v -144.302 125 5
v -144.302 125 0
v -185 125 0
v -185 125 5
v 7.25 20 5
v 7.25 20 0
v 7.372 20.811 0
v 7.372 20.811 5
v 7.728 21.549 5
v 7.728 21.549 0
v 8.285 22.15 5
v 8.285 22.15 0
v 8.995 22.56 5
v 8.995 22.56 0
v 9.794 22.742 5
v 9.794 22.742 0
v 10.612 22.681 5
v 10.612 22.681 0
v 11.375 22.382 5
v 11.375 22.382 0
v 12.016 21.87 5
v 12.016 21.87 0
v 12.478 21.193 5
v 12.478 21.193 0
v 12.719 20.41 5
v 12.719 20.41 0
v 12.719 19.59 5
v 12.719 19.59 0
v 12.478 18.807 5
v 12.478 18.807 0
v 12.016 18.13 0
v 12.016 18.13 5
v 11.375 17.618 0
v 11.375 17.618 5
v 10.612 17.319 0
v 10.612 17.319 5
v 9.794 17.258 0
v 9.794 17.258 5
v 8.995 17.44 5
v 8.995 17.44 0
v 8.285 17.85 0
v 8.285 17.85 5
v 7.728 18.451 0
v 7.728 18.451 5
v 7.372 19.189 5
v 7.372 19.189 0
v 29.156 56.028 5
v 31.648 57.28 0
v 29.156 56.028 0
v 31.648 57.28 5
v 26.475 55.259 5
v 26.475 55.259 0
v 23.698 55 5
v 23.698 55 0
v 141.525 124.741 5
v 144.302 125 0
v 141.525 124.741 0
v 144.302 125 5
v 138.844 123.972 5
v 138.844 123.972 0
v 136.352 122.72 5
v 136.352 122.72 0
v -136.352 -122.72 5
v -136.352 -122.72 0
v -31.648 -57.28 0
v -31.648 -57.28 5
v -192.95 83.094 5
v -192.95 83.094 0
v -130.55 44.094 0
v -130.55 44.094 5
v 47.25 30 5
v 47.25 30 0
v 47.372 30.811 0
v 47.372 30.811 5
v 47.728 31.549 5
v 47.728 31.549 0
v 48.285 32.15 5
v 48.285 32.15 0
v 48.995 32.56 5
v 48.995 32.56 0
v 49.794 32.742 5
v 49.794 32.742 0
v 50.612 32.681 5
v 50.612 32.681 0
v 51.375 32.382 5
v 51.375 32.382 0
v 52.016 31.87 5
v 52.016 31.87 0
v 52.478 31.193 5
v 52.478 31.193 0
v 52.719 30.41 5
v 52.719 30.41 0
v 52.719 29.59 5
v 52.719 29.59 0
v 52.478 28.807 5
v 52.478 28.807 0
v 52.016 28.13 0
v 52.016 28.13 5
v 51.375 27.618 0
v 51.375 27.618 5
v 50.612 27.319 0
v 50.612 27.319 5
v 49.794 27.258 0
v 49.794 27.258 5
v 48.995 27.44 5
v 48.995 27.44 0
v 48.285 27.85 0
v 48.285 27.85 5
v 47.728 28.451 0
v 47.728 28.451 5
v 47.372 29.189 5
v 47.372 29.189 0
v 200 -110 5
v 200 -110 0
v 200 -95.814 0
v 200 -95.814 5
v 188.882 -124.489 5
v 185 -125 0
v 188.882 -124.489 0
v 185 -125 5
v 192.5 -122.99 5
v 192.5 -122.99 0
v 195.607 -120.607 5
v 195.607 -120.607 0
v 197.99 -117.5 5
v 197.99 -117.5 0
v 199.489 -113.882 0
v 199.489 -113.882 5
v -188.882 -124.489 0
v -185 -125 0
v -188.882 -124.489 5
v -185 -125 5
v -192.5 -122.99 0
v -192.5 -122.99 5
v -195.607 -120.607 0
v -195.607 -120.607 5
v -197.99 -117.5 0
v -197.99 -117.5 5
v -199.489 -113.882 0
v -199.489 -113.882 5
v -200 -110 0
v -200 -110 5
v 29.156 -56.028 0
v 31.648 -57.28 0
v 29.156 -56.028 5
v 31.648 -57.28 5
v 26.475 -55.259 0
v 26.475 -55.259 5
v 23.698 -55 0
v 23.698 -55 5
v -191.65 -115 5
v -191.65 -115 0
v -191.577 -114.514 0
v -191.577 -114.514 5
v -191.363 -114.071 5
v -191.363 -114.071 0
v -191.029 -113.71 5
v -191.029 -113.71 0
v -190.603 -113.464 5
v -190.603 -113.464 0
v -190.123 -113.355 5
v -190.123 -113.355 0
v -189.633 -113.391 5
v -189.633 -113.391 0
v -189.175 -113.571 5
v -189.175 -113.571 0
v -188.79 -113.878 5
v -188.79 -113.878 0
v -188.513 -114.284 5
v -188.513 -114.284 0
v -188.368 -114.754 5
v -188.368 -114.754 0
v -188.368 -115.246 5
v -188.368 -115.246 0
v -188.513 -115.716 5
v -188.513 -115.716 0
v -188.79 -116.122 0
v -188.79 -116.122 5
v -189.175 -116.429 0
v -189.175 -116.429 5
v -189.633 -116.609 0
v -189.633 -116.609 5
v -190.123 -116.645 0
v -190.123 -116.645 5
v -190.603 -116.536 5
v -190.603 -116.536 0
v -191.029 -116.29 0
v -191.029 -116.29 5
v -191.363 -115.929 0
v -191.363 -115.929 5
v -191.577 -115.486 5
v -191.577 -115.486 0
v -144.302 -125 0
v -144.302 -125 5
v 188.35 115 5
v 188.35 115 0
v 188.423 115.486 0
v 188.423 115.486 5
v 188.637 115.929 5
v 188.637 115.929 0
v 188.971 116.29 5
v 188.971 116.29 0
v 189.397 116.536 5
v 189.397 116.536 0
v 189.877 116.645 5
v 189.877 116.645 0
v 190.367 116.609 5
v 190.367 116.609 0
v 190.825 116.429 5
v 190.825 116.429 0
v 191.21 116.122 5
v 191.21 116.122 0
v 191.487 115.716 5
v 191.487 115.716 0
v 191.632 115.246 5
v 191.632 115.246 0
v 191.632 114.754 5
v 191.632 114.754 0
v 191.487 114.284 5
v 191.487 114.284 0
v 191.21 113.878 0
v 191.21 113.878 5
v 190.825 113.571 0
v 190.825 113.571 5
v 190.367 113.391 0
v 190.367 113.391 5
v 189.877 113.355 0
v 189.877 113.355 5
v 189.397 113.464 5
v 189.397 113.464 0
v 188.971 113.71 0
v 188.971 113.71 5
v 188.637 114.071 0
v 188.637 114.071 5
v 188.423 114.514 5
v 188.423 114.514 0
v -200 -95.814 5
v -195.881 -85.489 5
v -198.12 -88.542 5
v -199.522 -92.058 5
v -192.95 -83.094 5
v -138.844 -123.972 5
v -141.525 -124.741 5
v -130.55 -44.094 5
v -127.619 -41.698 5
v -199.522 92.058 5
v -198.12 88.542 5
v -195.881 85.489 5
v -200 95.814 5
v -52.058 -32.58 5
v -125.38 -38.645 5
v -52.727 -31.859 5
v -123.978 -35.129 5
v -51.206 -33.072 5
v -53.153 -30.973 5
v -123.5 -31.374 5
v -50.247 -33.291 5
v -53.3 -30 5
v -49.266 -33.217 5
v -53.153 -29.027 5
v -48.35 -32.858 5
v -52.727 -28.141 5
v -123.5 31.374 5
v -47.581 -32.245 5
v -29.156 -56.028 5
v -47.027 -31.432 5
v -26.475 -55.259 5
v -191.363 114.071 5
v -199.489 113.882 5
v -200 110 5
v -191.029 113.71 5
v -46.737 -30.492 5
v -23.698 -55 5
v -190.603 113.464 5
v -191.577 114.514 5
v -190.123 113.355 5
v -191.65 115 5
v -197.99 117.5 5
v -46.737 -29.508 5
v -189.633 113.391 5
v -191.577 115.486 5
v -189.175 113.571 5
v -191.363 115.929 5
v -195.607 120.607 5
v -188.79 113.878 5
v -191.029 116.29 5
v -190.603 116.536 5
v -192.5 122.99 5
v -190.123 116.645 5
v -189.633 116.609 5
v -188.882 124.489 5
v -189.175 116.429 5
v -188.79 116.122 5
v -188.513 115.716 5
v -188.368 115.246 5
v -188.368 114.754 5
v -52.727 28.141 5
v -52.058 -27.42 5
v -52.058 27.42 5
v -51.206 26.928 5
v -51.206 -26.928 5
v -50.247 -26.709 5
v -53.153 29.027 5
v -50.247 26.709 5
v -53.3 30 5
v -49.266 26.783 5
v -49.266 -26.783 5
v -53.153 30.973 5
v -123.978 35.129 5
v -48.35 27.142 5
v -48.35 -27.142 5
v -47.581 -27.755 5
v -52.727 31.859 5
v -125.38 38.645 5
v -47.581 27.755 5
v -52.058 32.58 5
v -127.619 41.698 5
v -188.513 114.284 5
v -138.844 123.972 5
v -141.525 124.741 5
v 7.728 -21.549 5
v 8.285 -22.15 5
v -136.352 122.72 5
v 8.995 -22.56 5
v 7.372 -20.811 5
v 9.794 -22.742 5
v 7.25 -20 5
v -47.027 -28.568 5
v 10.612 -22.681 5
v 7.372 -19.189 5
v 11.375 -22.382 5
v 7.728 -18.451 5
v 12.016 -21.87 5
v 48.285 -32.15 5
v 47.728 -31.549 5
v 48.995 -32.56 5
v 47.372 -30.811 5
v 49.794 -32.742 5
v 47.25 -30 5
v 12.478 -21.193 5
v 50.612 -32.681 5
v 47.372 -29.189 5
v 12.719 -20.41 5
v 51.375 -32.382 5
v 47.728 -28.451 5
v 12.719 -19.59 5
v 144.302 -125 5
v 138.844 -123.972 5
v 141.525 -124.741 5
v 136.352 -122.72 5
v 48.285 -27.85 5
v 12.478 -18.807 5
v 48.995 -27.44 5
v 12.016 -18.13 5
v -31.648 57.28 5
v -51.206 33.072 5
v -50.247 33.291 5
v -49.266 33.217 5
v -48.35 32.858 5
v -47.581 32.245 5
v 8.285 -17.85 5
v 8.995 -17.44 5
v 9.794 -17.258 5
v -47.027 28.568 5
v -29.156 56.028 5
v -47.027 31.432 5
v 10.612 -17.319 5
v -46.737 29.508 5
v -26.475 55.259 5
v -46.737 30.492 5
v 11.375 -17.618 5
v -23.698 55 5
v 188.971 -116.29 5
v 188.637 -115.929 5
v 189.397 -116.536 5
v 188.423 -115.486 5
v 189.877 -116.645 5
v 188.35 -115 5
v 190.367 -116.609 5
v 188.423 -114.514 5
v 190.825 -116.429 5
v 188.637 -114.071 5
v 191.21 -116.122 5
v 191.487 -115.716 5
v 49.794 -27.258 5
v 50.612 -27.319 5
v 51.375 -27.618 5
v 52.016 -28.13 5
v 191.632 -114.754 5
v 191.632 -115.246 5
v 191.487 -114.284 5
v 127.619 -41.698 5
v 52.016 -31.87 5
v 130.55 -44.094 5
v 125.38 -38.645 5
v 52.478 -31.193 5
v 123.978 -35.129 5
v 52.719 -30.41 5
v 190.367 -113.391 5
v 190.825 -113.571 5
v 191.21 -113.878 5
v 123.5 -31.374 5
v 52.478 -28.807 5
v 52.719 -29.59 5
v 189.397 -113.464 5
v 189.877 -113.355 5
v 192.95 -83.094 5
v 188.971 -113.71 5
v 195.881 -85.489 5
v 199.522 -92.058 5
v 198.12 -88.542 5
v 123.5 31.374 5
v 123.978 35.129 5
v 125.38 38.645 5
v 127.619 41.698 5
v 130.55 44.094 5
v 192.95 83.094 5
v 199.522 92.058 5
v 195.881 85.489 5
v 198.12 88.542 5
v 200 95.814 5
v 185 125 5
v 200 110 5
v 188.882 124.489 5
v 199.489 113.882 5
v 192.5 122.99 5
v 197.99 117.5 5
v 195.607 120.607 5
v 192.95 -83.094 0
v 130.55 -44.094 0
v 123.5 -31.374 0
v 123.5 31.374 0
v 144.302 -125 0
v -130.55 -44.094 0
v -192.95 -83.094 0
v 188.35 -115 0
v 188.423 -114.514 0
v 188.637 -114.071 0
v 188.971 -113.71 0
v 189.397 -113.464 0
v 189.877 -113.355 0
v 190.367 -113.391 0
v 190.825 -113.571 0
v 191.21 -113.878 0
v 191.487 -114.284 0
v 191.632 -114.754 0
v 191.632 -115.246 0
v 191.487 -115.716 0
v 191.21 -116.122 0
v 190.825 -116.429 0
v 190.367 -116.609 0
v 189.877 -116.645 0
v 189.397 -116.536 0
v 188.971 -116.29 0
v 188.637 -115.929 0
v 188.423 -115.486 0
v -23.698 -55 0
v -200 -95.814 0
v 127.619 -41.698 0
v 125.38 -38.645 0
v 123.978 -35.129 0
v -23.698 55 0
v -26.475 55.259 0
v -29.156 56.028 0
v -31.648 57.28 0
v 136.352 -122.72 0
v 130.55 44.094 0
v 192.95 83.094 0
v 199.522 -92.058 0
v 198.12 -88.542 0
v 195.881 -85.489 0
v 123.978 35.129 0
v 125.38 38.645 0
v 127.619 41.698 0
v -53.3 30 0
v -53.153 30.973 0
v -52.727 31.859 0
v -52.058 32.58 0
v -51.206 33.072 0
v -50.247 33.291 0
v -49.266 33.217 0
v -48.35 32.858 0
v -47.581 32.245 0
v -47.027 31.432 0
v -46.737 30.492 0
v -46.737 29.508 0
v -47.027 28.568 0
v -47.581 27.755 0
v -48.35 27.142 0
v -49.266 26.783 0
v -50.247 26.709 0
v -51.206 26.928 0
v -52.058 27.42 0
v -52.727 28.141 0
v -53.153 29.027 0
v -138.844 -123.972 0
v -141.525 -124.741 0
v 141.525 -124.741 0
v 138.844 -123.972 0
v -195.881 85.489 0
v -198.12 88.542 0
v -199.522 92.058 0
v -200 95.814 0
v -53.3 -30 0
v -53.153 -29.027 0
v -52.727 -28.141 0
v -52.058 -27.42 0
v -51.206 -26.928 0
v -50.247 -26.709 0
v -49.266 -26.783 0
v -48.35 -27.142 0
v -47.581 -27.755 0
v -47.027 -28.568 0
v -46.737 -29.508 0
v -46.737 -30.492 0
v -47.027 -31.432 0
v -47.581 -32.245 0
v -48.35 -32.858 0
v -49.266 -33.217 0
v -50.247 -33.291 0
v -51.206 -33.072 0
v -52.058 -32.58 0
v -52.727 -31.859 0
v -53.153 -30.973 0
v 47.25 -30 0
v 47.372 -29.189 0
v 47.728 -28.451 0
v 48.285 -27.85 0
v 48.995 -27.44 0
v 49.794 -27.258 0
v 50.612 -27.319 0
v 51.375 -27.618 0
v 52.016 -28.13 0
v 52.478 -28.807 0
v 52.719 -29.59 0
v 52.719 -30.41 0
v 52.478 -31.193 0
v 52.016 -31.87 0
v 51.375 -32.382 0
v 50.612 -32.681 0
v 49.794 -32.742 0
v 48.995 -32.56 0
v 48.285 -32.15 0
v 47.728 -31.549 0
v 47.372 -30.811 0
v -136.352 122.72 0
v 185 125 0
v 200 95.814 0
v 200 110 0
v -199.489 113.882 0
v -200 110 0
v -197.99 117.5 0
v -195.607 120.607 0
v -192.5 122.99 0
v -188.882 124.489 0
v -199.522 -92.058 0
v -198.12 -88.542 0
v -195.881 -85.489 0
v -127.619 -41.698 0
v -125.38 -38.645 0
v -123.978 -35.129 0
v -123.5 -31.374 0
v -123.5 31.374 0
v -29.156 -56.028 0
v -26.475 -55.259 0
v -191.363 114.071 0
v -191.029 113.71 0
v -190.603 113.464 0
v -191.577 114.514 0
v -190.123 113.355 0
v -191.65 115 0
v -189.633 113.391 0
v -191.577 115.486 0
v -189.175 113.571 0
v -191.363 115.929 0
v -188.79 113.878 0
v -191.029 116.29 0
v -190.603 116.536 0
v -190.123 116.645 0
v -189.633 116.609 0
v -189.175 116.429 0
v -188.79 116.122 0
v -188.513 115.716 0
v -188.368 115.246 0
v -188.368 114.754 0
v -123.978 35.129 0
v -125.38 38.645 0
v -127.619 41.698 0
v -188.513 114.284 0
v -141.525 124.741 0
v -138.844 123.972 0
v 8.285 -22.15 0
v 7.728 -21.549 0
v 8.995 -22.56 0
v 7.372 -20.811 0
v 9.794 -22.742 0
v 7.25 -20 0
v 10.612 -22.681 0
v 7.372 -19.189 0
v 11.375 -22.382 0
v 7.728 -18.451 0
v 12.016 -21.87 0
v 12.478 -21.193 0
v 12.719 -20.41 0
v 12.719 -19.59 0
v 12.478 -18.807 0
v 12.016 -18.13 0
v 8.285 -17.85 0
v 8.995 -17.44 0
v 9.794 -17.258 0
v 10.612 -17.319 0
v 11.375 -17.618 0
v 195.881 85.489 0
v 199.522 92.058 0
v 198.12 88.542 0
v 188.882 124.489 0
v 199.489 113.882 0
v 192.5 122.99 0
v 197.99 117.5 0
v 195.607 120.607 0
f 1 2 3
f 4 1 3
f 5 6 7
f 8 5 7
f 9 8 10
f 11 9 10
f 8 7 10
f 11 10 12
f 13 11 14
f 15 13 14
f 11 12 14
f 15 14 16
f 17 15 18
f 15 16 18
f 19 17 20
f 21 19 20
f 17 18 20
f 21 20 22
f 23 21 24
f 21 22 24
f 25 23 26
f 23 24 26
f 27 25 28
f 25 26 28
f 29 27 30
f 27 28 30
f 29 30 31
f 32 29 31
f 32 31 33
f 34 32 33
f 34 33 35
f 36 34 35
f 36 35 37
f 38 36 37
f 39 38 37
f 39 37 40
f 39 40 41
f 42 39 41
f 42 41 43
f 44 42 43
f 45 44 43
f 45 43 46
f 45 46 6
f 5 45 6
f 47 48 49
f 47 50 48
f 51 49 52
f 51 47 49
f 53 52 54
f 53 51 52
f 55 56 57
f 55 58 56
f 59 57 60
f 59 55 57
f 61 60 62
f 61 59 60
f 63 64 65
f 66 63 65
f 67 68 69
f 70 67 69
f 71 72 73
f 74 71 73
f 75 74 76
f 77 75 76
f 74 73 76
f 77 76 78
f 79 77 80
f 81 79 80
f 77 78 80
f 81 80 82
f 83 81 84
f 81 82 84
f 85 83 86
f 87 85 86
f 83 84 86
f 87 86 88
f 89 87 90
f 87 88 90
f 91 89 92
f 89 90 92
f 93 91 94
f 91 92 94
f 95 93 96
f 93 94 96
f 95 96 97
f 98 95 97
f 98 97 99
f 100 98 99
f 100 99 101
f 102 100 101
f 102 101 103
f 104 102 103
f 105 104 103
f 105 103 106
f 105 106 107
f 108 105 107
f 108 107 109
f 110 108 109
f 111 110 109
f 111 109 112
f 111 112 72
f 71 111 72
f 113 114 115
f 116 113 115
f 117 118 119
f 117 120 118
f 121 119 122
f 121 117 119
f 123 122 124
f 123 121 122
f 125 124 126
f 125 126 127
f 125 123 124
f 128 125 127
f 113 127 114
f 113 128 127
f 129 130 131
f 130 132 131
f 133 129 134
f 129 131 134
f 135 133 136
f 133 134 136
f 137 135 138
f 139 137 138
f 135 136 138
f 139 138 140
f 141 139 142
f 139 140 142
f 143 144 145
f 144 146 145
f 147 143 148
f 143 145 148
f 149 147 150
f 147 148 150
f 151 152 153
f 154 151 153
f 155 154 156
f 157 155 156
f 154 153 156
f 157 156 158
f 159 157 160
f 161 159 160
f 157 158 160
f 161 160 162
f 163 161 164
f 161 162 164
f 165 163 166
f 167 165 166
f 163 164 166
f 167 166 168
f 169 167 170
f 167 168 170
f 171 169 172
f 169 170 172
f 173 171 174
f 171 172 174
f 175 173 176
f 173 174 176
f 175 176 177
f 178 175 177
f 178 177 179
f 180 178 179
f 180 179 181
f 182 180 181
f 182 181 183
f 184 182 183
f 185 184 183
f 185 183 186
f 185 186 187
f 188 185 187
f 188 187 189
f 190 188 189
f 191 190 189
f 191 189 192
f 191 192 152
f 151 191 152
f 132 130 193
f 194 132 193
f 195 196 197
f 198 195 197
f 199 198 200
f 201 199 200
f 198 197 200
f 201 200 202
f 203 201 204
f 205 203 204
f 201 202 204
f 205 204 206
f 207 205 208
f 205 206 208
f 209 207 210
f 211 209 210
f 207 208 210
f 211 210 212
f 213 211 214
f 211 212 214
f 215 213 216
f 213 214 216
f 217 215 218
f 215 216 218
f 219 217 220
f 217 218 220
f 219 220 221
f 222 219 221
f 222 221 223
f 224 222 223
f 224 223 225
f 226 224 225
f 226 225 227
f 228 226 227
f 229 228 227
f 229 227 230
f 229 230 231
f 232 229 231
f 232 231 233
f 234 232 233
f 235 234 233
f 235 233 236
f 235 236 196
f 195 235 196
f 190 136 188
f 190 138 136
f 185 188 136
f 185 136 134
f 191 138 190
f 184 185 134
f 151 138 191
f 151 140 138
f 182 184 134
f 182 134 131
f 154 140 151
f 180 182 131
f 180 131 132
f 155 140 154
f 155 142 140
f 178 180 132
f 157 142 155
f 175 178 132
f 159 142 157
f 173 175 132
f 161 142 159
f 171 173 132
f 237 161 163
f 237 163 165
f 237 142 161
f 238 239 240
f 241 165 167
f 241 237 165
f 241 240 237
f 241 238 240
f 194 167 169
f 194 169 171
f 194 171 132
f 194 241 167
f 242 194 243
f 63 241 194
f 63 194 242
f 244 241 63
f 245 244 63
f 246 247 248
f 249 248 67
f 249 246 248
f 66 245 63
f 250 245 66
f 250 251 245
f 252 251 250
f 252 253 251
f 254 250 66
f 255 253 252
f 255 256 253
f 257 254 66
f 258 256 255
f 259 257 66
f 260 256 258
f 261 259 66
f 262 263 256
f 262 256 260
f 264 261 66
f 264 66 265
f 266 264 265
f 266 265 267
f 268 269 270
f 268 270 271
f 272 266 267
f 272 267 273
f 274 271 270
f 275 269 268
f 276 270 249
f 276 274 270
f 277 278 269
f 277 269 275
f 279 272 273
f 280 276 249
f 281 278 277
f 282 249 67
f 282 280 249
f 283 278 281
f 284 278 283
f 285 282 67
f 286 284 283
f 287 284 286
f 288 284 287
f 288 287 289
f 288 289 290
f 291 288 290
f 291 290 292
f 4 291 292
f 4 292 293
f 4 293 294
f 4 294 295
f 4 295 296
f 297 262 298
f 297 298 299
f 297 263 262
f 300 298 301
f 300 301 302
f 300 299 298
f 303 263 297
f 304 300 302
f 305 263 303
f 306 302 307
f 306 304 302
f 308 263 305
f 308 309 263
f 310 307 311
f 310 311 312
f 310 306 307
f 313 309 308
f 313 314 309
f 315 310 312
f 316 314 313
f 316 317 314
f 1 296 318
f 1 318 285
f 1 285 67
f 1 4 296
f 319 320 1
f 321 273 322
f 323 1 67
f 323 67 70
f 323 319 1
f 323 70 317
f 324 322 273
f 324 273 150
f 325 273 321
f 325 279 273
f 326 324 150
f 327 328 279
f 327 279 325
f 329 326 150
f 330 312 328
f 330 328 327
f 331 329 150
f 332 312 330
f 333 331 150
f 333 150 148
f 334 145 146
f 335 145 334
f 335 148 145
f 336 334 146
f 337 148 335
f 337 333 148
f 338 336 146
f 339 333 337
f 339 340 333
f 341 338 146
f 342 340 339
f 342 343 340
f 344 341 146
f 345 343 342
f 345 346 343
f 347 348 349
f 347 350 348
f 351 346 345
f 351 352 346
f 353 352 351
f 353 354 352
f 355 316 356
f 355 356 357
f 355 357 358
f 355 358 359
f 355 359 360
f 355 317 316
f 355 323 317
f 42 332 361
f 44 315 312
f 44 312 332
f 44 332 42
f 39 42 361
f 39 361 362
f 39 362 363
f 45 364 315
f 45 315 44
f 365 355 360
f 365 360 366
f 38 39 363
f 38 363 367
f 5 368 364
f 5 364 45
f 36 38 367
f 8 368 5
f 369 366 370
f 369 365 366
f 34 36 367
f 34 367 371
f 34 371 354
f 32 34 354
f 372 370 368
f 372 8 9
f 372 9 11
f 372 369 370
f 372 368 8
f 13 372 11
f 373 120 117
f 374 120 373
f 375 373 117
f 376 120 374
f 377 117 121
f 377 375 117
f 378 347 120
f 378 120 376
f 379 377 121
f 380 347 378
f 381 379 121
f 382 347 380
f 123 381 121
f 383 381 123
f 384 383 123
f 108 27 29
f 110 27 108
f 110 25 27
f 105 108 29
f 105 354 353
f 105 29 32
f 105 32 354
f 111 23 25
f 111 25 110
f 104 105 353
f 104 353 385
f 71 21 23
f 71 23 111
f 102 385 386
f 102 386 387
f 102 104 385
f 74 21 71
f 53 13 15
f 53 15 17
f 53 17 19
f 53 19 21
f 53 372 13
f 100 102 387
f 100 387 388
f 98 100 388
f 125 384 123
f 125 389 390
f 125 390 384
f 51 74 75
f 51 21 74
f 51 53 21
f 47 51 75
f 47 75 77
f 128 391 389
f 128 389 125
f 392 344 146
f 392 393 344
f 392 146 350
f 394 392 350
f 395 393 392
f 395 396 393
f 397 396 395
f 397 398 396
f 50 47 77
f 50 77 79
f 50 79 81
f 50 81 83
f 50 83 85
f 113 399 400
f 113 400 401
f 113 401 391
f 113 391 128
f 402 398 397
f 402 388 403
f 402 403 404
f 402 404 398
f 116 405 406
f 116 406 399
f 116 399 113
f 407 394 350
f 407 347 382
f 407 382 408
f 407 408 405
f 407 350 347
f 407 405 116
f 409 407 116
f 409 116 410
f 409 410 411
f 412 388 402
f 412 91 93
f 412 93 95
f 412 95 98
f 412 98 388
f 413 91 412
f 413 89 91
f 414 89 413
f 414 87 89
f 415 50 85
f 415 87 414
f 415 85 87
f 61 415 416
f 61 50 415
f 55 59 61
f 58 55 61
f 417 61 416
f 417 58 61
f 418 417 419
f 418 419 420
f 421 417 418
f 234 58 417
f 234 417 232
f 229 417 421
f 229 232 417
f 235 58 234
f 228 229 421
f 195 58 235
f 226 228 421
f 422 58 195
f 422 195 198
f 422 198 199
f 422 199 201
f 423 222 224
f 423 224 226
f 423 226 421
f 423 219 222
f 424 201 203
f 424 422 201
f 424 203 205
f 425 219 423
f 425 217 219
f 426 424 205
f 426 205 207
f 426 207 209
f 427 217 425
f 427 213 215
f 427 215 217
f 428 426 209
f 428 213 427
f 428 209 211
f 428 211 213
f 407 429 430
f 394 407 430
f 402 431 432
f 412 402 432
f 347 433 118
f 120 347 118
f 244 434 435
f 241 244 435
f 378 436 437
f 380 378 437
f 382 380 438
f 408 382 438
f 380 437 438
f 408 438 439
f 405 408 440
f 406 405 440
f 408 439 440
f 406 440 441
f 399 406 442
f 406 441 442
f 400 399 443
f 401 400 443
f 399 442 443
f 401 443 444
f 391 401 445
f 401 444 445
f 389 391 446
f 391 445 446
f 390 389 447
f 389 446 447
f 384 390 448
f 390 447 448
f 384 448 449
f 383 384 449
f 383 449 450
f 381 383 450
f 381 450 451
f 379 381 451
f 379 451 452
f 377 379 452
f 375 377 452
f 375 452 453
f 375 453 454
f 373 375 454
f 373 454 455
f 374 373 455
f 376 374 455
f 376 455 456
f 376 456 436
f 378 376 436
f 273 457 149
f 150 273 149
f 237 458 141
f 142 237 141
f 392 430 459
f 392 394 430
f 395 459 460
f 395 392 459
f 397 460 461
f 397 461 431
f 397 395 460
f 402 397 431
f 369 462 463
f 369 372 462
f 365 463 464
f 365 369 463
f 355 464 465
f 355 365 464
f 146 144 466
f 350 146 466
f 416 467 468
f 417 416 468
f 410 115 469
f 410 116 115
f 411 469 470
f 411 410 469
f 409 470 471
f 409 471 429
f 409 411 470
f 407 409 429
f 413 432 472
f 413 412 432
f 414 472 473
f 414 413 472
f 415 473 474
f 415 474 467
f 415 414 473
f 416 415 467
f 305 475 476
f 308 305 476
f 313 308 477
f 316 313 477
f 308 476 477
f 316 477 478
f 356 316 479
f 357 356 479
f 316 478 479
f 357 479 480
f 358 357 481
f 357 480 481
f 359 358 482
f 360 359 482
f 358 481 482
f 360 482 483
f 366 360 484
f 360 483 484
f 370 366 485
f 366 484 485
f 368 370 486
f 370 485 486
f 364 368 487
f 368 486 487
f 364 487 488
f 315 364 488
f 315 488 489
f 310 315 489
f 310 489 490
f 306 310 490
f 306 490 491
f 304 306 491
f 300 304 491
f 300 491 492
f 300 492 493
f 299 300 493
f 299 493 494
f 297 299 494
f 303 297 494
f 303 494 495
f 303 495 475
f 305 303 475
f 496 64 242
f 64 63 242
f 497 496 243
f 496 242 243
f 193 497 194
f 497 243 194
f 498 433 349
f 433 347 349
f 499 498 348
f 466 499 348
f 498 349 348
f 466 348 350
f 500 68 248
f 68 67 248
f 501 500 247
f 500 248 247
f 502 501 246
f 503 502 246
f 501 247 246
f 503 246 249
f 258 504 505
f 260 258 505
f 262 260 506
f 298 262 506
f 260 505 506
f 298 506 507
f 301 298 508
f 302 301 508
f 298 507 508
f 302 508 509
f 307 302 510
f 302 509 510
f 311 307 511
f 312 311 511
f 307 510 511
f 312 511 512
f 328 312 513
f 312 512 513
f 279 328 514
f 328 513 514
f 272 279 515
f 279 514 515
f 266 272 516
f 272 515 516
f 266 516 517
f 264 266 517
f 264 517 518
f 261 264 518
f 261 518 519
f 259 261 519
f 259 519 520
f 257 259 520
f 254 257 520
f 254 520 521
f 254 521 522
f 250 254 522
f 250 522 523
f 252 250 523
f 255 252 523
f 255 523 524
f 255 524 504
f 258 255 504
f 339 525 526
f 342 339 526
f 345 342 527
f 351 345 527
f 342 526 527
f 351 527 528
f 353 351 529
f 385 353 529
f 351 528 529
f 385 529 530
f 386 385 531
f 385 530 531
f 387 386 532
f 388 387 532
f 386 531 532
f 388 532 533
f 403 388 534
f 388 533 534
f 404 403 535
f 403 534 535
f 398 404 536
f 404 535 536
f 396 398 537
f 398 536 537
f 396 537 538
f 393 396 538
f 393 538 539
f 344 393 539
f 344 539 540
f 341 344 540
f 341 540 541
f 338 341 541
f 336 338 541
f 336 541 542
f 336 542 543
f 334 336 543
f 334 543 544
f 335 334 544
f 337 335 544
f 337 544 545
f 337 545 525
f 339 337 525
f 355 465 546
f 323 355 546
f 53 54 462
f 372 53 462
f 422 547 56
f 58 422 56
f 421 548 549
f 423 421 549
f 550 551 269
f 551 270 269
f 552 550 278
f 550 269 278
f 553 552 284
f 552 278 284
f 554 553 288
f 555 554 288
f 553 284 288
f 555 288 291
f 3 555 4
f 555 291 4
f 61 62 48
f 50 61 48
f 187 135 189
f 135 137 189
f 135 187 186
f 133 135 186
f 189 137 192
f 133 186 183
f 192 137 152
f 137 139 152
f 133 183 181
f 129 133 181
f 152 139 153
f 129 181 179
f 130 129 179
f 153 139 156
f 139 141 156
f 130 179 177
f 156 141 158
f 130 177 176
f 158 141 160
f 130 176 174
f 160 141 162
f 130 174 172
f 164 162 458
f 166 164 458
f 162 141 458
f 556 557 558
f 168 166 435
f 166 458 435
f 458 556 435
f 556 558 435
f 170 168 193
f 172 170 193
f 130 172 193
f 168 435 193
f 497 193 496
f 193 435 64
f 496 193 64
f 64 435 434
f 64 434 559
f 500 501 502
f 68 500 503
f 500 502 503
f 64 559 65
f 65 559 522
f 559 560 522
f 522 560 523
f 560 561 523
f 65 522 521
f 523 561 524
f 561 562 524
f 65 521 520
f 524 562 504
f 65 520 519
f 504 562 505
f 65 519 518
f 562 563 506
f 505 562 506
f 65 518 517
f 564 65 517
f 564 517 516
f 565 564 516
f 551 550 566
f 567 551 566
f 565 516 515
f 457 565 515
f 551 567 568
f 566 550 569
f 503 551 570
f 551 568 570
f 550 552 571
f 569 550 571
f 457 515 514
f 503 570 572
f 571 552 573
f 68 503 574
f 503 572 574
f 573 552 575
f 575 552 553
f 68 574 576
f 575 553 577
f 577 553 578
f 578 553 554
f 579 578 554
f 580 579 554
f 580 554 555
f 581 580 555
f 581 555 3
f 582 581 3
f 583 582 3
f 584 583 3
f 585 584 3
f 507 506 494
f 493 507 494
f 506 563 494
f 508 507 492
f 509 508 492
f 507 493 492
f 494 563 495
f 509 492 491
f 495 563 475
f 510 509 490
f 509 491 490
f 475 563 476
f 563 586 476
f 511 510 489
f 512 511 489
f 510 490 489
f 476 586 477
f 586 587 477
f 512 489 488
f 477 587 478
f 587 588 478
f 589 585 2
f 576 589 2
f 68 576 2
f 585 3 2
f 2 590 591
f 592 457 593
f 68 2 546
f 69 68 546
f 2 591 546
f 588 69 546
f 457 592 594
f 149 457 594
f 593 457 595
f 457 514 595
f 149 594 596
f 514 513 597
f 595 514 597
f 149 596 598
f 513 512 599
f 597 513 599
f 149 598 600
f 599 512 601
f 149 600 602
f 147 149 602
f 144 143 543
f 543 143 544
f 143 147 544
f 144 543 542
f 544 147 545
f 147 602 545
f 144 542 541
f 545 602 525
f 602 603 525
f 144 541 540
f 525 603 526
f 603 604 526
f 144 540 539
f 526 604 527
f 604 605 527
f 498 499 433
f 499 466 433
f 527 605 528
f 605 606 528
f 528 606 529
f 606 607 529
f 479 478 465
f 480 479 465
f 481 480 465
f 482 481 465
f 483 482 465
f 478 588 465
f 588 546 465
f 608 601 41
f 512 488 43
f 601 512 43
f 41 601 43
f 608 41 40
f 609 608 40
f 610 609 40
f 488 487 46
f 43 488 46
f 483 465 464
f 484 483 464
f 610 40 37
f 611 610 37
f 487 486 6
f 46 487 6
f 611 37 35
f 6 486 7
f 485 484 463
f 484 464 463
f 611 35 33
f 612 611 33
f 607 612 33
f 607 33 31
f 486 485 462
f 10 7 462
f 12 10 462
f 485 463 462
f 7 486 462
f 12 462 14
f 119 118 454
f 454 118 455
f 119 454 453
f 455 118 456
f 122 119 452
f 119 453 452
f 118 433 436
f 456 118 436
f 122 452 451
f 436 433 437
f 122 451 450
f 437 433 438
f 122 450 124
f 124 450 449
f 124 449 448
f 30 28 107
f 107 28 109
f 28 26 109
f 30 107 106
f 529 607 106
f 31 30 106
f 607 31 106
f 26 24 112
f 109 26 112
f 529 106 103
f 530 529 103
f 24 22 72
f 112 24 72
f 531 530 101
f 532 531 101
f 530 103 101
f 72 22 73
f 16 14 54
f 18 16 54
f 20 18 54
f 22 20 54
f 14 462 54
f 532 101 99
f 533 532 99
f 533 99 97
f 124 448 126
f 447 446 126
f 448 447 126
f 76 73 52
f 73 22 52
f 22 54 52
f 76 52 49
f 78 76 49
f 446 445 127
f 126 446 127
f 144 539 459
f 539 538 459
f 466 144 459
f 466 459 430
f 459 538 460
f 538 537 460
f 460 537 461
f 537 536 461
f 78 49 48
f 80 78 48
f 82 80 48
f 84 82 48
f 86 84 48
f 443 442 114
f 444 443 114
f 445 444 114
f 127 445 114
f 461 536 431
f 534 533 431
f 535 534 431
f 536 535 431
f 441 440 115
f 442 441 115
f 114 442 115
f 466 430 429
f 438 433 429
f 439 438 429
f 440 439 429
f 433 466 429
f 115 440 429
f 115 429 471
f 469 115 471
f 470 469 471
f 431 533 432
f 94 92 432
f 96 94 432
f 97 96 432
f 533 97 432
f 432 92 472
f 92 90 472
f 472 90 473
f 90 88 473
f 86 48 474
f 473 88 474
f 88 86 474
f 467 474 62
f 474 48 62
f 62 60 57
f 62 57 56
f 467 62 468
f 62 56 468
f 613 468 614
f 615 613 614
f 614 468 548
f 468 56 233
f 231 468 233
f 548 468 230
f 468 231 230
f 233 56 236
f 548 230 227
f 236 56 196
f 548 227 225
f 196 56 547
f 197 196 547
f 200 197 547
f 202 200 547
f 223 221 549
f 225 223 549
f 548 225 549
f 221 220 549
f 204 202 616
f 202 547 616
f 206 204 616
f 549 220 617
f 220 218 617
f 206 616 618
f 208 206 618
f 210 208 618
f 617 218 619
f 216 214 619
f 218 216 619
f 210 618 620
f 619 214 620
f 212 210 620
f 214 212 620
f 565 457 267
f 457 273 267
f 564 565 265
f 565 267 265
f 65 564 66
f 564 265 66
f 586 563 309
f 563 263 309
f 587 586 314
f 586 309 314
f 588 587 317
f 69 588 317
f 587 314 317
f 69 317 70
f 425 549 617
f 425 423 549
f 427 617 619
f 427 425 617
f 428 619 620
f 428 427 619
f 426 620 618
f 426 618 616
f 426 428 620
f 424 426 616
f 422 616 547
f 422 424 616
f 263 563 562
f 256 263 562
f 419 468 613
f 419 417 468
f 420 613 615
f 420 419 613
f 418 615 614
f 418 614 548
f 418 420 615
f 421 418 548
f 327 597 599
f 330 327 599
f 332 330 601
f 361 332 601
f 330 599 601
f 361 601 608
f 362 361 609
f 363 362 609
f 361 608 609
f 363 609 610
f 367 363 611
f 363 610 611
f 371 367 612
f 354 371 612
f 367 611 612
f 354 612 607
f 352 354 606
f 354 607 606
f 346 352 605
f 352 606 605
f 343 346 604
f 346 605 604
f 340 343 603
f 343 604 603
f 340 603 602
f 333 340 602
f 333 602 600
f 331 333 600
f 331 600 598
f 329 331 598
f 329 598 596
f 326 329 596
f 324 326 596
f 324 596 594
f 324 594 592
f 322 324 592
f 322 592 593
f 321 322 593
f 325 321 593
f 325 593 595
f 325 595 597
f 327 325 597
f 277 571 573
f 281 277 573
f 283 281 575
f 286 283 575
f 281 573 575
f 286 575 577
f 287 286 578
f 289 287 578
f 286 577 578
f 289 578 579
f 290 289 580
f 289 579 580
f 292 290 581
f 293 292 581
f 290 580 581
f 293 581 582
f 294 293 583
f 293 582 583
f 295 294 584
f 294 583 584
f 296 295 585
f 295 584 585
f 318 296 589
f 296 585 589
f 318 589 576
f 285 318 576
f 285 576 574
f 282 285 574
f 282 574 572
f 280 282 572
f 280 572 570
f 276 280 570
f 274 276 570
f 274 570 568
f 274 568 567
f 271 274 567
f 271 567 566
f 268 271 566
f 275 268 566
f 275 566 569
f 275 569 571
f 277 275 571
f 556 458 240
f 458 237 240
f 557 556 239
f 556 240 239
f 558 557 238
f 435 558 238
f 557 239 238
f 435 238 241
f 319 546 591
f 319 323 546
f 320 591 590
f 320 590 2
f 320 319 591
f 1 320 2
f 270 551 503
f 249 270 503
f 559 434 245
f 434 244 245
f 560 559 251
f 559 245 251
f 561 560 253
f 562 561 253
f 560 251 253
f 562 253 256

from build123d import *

# Parameters (mm, degrees)
F1_DEPTH = 5
F3_D     = 3.3
F3_DEPTH = 13.8
F3_TIP   = 0.9914200214
F4_D     = 5.5
F4_DEPTH = 13.8
F4_TIP   = 1.6523667023
F5_D     = 6.6
F5_DEPTH = 13.8
F5_TIP   = 1.9828400428
F6_R     = 15


with BuildPart() as f1:
    # F0 (on Top) → F1 (new body)
    with BuildSketch(Plane.XY):
        Polygon((140, -125), (200, -125), (200, -87.5), (123.5, -39.6875), (123.5, 39.6875), (200, 87.5), (200, 125), (140, 125), (28, 55), (-28, 55), (-140, 125), (-200, 125), (-200, 87.5), (-123.5, 39.6875), (-123.5, -39.6875), (-200, -87.5), (-200, -125), (-140, -125), (-28, -55), (28, -55), align=None)
    extrude(amount=F1_DEPTH)

    # F3
    with Locations(Plane.XY.offset(5)):
        with Locations((-190, 115), (-190, -115), (190, -115), (190, 115)):
            Hole(F3_D / 2, depth=F3_DEPTH)
            with Locations((0, 0, -(F3_DEPTH + F3_TIP / 2))):  # 118° drill point
                Cone(0, F3_D / 2, F3_TIP, mode=Mode.SUBTRACT)

    # F4
    with Locations(Plane.XY.offset(5)):
        with Locations((50, -30), (50, 30), (10, 20), (10, -20)):
            Hole(F4_D / 2, depth=F4_DEPTH)
            with Locations((0, 0, -(F4_DEPTH + F4_TIP / 2))):  # 118° drill point
                Cone(0, F4_D / 2, F4_TIP, mode=Mode.SUBTRACT)

    # F5
    with Locations(Plane.XY.offset(5)):
        with Locations((-50, 30), (-50, -30)):
            Hole(F5_D / 2, depth=F5_DEPTH)
            with Locations((0, 0, -(F5_DEPTH + F5_TIP / 2))):  # 118° drill point
                Cone(0, F5_D / 2, F5_TIP, mode=Mode.SUBTRACT)

    # F6
    f6_edges = [f1.edges().sort_by_distance(p)[0] for p in [
        (-28, -55, 2.5),
        (28, -55, 2.5),
        (140, -125, 2.5),
        (200, -125, 2.5),
        (200, -87.5, 2.5),
        (123.5, -39.6875, 2.5),
        (123.5, 39.6875, 2.5),
        (200, 87.5, 2.5),
        (200, 125, 2.5),
        (140, 125, 2.5),
        (28, 55, 2.5),
        (-28, 55, 2.5),
        (-140, 125, 2.5),
        (-200, 125, 2.5),
        (-200, 87.5, 2.5),
        (-123.5, 39.6875, 2.5),
        (-123.5, -39.6875, 2.5),
        (-200, -87.5, 2.5),
        (-200, -125, 2.5),
        (-140, -125, 2.5),
    ]]
    fillet(f6_edges, radius=F6_R)


solid = f1.part
